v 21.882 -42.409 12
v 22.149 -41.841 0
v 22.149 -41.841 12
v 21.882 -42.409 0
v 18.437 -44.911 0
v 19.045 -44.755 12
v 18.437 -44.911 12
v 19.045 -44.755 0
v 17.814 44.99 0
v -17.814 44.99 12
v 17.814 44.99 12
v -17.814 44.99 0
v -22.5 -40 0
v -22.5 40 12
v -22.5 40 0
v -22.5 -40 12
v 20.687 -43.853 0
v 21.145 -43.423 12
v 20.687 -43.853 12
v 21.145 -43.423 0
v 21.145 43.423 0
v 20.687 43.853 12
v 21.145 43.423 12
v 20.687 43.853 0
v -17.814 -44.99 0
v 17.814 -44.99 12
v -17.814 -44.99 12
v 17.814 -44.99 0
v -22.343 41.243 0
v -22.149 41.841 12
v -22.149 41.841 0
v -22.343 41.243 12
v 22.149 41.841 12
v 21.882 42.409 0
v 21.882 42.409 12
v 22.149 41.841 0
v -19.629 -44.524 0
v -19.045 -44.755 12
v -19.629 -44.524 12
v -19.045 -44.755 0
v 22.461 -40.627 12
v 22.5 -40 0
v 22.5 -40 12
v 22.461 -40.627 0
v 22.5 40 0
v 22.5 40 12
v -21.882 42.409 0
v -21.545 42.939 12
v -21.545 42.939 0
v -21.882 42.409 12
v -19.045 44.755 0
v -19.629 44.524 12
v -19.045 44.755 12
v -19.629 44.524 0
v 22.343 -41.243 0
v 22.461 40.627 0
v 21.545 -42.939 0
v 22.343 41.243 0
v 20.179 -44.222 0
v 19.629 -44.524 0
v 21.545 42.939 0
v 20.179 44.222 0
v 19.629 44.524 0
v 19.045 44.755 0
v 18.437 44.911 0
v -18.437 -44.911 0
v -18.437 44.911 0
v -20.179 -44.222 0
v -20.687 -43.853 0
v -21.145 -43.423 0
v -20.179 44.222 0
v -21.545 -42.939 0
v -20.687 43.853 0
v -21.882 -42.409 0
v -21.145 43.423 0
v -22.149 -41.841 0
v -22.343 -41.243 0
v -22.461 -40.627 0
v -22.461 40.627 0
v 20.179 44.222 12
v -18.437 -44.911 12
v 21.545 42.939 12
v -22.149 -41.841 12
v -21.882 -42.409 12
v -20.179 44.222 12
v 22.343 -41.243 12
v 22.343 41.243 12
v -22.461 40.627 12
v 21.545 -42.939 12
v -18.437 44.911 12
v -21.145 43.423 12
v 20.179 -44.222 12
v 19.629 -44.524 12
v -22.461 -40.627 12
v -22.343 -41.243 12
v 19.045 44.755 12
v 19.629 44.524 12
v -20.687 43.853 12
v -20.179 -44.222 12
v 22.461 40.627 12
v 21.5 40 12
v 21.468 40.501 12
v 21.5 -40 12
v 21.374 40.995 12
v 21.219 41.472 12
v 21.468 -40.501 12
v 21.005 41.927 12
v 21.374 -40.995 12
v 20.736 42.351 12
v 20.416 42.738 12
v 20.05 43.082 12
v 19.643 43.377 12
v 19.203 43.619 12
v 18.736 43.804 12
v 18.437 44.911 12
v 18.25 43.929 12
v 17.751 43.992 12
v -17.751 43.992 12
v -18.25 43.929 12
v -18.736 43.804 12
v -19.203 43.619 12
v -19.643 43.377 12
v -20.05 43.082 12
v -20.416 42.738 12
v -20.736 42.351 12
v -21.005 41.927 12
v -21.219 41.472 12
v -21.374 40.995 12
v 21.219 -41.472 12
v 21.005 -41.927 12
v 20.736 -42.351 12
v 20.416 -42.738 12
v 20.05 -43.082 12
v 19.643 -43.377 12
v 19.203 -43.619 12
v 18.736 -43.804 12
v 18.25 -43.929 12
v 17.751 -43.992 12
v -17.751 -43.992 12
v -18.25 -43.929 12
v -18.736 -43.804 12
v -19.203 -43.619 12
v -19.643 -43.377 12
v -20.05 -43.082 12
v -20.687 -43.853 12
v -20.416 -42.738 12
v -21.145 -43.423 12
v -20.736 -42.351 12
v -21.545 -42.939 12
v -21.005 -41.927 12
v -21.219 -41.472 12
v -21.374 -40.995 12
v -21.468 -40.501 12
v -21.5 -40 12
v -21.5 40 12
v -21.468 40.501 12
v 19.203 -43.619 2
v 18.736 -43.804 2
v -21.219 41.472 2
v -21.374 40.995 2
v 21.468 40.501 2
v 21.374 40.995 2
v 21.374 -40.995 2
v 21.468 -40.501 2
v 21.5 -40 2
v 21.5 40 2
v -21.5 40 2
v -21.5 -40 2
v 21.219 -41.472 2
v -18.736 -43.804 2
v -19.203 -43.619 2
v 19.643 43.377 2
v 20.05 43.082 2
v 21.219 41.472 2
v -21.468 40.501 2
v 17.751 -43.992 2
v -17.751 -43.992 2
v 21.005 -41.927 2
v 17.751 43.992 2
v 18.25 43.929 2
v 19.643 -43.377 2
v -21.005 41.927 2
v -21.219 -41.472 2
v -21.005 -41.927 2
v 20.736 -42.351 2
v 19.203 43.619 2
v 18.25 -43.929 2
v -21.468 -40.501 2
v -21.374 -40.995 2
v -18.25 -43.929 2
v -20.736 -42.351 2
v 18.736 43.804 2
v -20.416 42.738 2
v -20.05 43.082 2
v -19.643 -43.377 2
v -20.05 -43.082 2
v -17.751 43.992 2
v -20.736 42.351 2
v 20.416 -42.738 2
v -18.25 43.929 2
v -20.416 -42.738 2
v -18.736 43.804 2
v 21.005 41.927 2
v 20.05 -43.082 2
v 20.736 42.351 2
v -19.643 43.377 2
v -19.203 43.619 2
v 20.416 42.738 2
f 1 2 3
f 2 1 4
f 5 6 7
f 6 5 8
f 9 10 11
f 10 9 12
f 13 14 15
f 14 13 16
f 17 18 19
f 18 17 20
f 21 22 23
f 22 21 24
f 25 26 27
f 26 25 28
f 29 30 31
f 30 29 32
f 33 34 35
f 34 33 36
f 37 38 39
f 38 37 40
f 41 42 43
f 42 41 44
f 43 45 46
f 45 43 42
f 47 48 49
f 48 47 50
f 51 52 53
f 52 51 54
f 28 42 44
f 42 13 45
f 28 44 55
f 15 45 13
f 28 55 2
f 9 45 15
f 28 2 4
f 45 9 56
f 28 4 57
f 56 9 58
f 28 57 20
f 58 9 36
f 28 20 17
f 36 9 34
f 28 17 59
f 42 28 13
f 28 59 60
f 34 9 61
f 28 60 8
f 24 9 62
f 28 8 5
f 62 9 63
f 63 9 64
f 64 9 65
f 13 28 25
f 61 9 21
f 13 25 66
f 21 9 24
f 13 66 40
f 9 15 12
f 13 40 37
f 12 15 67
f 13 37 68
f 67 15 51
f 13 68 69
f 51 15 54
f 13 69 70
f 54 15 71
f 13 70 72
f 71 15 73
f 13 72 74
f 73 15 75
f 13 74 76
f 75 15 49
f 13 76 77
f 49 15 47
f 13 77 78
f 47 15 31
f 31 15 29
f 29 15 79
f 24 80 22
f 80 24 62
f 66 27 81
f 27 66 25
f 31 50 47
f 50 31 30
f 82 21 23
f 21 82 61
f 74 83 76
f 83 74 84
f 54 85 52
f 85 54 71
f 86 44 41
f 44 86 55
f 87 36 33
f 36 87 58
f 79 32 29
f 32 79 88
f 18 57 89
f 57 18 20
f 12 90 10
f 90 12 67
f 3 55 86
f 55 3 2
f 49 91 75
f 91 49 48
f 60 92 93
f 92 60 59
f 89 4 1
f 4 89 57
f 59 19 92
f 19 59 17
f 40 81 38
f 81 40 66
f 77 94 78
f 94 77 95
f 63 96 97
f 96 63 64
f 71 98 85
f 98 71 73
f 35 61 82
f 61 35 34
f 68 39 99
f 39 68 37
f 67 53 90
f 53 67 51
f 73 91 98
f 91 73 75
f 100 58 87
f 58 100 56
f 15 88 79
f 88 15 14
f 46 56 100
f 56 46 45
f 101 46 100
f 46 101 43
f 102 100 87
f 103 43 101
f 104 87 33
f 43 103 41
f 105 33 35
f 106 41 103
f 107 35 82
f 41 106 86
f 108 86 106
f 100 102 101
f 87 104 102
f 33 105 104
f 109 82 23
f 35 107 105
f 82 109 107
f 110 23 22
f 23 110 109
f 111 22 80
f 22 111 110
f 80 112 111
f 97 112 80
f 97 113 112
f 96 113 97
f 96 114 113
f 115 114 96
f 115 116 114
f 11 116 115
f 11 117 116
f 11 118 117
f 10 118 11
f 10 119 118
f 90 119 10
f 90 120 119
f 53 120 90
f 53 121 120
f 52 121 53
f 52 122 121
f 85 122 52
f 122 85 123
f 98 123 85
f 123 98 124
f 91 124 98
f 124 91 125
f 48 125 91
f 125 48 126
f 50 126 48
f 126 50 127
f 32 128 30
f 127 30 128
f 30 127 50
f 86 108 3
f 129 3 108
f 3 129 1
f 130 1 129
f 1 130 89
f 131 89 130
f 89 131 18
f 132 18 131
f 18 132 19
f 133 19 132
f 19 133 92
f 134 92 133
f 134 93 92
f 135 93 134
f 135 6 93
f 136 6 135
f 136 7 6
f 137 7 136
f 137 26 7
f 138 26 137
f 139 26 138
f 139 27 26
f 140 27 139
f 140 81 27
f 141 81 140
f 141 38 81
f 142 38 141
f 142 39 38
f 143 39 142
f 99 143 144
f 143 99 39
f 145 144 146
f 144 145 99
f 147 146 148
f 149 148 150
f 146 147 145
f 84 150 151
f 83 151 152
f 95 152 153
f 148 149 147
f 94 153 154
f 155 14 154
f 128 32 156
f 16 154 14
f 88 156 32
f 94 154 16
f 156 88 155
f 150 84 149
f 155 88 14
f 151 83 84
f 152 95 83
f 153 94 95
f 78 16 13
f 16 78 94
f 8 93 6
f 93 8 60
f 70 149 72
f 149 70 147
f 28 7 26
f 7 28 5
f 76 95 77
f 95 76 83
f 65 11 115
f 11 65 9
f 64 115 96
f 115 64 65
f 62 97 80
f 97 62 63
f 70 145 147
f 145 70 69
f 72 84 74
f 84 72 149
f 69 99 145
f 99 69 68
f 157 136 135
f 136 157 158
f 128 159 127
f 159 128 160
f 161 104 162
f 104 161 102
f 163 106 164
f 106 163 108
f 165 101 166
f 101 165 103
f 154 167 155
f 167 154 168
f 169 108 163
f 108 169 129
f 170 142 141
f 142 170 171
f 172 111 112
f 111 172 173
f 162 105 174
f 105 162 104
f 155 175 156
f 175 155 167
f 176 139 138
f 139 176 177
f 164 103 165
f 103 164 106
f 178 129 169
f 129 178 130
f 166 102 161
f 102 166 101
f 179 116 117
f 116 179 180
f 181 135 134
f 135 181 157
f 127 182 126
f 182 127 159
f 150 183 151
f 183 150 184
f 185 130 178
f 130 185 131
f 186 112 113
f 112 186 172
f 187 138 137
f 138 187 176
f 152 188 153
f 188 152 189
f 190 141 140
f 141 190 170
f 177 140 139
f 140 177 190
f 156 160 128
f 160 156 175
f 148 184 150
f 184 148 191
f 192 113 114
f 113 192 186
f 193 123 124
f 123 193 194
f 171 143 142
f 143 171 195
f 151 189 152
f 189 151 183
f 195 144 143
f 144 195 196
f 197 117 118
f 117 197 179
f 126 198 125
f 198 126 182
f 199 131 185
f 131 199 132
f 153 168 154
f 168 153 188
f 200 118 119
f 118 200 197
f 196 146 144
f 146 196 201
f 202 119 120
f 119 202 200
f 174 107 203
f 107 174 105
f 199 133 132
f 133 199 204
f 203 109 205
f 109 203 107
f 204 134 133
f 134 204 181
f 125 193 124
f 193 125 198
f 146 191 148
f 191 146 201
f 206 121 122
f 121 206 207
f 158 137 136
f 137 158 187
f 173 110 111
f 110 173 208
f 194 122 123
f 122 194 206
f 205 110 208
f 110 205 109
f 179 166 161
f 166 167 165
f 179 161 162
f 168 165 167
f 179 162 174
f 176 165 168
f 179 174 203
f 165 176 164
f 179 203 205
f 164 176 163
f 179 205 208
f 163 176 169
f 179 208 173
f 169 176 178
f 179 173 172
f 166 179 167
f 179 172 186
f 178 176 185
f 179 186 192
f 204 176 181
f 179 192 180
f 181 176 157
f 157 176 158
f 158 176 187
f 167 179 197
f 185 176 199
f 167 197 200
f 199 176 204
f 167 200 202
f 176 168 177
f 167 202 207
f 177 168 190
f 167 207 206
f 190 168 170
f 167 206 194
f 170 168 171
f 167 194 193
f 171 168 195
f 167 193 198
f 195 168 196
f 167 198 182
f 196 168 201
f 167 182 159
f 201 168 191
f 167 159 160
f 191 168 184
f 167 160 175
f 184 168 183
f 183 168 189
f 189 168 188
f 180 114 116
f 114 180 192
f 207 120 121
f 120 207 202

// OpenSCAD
$fn = 50;


difference() {
	union() {
		hull() {
			translate(v = [-17.5000000000, 40.0000000000, 0]) {
				cylinder(h = 12, r = 5);
			}
			translate(v = [17.5000000000, 40.0000000000, 0]) {
				cylinder(h = 12, r = 5);
			}
			translate(v = [-17.5000000000, -40.0000000000, 0]) {
				cylinder(h = 12, r = 5);
			}
			translate(v = [17.5000000000, -40.0000000000, 0]) {
				cylinder(h = 12, r = 5);
			}
		}
	}
	union() {
		translate(v = [0, 0, 2]) {
			hull() {
				translate(v = [-17.5000000000, 40.0000000000, 0]) {
					cylinder(h = 10, r = 4);
				}
				translate(v = [17.5000000000, 40.0000000000, 0]) {
					cylinder(h = 10, r = 4);
				}
				translate(v = [-17.5000000000, -40.0000000000, 0]) {
					cylinder(h = 10, r = 4);
				}
				translate(v = [17.5000000000, -40.0000000000, 0]) {
					cylinder(h = 10, r = 4);
				}
			}
		}
	}
}
